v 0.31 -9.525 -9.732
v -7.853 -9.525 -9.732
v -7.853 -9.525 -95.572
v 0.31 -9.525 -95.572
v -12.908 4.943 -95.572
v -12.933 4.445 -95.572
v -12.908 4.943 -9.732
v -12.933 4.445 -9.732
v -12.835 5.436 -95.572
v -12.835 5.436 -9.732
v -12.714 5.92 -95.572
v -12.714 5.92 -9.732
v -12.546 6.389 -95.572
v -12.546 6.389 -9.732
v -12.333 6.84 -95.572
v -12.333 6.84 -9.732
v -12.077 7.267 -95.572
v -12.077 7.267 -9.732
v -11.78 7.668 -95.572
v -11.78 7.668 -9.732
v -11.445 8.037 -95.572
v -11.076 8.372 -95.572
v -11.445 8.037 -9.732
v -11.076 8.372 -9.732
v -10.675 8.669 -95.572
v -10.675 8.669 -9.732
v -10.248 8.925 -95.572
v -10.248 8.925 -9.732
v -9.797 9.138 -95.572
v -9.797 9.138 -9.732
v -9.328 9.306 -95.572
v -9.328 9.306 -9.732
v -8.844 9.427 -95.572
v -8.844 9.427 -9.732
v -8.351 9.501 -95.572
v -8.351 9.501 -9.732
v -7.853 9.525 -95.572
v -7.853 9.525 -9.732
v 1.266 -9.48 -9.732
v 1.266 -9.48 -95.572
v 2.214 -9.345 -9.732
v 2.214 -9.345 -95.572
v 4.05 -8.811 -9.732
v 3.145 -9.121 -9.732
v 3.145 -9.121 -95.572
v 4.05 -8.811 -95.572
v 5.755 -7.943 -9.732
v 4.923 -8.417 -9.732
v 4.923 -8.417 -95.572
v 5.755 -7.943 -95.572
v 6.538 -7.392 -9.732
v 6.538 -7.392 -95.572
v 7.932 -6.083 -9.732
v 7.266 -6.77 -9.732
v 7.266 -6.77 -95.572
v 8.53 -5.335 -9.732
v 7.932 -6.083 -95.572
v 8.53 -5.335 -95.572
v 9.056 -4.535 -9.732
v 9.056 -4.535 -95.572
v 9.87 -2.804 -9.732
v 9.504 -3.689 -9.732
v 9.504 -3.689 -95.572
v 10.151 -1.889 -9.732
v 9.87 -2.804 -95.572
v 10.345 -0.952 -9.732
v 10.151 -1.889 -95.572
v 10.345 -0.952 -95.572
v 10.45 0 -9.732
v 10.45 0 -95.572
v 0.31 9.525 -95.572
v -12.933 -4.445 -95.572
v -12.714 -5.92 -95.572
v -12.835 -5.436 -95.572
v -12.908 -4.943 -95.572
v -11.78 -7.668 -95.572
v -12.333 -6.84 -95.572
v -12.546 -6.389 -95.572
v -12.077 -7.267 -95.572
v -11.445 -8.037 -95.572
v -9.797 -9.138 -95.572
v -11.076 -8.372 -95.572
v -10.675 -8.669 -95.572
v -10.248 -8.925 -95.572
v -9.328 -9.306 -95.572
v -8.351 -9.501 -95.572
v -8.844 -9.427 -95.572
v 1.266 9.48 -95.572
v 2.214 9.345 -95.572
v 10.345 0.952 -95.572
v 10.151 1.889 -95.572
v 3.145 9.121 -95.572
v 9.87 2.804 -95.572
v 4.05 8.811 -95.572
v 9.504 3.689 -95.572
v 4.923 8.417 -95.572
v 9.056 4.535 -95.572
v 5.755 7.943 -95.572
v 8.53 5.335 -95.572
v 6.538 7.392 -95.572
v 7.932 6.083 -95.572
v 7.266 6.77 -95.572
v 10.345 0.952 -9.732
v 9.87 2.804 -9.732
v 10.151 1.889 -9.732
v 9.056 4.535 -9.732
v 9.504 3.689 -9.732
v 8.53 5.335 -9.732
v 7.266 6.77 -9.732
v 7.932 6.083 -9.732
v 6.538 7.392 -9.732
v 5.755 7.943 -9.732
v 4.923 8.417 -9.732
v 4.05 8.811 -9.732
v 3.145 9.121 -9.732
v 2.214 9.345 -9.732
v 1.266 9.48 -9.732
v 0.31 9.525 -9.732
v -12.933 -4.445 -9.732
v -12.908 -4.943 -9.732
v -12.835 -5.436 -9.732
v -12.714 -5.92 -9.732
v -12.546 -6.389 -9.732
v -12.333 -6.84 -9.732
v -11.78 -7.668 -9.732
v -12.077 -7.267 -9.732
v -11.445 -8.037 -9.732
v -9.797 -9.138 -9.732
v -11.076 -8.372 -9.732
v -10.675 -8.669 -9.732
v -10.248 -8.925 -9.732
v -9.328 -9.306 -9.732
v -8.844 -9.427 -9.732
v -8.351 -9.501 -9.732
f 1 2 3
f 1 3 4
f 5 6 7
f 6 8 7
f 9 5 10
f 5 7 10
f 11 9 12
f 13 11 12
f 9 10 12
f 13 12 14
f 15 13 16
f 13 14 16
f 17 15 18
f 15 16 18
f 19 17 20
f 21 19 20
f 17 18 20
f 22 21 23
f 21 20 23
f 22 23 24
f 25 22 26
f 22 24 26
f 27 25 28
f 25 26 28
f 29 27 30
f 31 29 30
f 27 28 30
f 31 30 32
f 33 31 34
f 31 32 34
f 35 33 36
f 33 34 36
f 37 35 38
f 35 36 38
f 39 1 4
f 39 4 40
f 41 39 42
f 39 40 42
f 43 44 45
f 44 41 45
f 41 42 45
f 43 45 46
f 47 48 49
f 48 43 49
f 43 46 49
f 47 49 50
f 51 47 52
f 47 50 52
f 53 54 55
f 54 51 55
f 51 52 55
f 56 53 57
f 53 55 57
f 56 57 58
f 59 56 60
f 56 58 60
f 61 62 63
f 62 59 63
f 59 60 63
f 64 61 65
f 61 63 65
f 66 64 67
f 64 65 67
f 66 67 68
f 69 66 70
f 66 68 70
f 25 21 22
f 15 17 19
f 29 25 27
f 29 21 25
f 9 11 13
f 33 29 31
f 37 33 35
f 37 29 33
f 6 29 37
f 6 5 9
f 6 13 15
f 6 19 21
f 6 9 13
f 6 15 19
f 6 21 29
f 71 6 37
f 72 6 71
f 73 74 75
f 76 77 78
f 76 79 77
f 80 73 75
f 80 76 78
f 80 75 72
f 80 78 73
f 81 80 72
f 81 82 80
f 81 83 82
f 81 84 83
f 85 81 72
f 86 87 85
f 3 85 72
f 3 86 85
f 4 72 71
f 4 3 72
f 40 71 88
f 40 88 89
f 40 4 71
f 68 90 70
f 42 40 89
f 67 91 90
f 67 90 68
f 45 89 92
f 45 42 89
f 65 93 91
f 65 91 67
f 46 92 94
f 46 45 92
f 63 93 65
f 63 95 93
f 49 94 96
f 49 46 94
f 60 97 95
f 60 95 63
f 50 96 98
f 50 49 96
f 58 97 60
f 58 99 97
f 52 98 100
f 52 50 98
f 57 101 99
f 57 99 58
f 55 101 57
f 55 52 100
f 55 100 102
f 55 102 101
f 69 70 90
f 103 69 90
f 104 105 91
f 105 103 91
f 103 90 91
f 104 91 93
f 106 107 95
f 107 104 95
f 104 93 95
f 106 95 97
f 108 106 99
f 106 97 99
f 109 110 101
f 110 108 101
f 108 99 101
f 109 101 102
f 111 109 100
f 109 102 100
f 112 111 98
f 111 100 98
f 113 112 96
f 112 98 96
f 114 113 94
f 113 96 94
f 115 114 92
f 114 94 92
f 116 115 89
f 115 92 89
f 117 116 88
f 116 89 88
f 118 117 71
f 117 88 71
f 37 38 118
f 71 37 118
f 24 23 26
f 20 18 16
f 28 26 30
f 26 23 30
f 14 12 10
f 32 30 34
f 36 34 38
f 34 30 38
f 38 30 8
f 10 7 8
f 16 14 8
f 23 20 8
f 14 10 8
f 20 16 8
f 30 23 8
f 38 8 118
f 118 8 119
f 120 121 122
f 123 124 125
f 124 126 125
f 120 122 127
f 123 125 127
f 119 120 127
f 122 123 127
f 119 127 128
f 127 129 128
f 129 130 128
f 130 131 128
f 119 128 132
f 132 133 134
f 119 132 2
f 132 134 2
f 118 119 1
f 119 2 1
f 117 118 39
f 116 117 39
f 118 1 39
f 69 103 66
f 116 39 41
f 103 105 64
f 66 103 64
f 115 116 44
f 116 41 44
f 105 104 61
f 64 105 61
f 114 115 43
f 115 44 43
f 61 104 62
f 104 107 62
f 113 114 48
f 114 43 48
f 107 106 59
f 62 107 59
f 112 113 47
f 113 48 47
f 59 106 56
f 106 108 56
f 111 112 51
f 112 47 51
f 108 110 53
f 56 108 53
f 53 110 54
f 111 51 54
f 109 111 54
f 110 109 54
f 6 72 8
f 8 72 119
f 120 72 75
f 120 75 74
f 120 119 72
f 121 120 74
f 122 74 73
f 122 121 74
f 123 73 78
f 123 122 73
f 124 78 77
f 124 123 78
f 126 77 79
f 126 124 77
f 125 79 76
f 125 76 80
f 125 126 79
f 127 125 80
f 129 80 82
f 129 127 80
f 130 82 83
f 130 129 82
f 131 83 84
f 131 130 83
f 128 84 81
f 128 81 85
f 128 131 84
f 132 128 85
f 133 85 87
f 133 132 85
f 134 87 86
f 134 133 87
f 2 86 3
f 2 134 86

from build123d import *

# Parameters (mm, degrees)
F1_DEPTH    = 9.525
F0_W        = 23.402531108
F0_H        = 85.8396906406
F3_T1_DEPTH = 136.6396906406
F4_R        = 5.08


# Not quite as in the source:
# - a fillet or chamfer that OpenCascade refuses, or shapes differently, is made with other operations: its cross-section is extruded or revolved along the edge and cut away or added


with BuildPart() as f1:
    # F0 (on Front) → F1 (new body, symmetric)
    with BuildSketch(Plane.XZ):
        Polygon((-2.3270829115, -113.9840111136), (-12.9329506308, -113.9840111136), (-12.9329506308, -186.3234937191), (-2.3270829115, -199.3203783987), (8.2787848078, -186.3234937191), (8.2787848078, -113.9840111136), align=None)
    extrude(amount=F1_DEPTH, both=True)


with BuildPart() as f1b:
    # F0 (on Front) → F1, piece 2 (new body, symmetric)
    with BuildSketch(Plane.XZ):
        with Locations((-1.2316850768, -52.651762031)):
            Rectangle(F0_W, F0_H)
    extrude(amount=F1_DEPTH, both=True)

    # F3: fillet of radius 10.16 on 2 edges, made by hand

    # F3_s2 → F3_t1 (cut)
    with BuildSketch(Plane.XY.offset(-120.9716073513)):
        with BuildLine():
            ThreePointArc((0.3095804772, -9.525), (7.4937853741, -6.5492048969), (10.4695804772, 0.635))
            Line((10.4695804772, 0.635), (10.4695804772, -9.525))
            Line((10.4695804772, -9.525), (0.3095804772, -9.525))
        make_face()
        with BuildLine():
            ThreePointArc((10.4695804772, -0.635), (7.4937853741, 6.5492048969), (0.3095804772, 9.525))
            Line((0.3095804772, 9.525), (10.4695804772, 9.525))
            Line((10.4695804772, 9.525), (10.4695804772, -0.635))
        make_face()
    extrude(amount=F3_T1_DEPTH, mode=Mode.SUBTRACT)

    # F4
    f4_edges = [f1b.edges().sort_by_distance(p)[0] for p in [
        (-12.932951, 9.525, -52.651762),
        (-12.932951, -9.525, -52.651762),
    ]]
    fillet(f4_edges, radius=F4_R)


solid = f1b.part
